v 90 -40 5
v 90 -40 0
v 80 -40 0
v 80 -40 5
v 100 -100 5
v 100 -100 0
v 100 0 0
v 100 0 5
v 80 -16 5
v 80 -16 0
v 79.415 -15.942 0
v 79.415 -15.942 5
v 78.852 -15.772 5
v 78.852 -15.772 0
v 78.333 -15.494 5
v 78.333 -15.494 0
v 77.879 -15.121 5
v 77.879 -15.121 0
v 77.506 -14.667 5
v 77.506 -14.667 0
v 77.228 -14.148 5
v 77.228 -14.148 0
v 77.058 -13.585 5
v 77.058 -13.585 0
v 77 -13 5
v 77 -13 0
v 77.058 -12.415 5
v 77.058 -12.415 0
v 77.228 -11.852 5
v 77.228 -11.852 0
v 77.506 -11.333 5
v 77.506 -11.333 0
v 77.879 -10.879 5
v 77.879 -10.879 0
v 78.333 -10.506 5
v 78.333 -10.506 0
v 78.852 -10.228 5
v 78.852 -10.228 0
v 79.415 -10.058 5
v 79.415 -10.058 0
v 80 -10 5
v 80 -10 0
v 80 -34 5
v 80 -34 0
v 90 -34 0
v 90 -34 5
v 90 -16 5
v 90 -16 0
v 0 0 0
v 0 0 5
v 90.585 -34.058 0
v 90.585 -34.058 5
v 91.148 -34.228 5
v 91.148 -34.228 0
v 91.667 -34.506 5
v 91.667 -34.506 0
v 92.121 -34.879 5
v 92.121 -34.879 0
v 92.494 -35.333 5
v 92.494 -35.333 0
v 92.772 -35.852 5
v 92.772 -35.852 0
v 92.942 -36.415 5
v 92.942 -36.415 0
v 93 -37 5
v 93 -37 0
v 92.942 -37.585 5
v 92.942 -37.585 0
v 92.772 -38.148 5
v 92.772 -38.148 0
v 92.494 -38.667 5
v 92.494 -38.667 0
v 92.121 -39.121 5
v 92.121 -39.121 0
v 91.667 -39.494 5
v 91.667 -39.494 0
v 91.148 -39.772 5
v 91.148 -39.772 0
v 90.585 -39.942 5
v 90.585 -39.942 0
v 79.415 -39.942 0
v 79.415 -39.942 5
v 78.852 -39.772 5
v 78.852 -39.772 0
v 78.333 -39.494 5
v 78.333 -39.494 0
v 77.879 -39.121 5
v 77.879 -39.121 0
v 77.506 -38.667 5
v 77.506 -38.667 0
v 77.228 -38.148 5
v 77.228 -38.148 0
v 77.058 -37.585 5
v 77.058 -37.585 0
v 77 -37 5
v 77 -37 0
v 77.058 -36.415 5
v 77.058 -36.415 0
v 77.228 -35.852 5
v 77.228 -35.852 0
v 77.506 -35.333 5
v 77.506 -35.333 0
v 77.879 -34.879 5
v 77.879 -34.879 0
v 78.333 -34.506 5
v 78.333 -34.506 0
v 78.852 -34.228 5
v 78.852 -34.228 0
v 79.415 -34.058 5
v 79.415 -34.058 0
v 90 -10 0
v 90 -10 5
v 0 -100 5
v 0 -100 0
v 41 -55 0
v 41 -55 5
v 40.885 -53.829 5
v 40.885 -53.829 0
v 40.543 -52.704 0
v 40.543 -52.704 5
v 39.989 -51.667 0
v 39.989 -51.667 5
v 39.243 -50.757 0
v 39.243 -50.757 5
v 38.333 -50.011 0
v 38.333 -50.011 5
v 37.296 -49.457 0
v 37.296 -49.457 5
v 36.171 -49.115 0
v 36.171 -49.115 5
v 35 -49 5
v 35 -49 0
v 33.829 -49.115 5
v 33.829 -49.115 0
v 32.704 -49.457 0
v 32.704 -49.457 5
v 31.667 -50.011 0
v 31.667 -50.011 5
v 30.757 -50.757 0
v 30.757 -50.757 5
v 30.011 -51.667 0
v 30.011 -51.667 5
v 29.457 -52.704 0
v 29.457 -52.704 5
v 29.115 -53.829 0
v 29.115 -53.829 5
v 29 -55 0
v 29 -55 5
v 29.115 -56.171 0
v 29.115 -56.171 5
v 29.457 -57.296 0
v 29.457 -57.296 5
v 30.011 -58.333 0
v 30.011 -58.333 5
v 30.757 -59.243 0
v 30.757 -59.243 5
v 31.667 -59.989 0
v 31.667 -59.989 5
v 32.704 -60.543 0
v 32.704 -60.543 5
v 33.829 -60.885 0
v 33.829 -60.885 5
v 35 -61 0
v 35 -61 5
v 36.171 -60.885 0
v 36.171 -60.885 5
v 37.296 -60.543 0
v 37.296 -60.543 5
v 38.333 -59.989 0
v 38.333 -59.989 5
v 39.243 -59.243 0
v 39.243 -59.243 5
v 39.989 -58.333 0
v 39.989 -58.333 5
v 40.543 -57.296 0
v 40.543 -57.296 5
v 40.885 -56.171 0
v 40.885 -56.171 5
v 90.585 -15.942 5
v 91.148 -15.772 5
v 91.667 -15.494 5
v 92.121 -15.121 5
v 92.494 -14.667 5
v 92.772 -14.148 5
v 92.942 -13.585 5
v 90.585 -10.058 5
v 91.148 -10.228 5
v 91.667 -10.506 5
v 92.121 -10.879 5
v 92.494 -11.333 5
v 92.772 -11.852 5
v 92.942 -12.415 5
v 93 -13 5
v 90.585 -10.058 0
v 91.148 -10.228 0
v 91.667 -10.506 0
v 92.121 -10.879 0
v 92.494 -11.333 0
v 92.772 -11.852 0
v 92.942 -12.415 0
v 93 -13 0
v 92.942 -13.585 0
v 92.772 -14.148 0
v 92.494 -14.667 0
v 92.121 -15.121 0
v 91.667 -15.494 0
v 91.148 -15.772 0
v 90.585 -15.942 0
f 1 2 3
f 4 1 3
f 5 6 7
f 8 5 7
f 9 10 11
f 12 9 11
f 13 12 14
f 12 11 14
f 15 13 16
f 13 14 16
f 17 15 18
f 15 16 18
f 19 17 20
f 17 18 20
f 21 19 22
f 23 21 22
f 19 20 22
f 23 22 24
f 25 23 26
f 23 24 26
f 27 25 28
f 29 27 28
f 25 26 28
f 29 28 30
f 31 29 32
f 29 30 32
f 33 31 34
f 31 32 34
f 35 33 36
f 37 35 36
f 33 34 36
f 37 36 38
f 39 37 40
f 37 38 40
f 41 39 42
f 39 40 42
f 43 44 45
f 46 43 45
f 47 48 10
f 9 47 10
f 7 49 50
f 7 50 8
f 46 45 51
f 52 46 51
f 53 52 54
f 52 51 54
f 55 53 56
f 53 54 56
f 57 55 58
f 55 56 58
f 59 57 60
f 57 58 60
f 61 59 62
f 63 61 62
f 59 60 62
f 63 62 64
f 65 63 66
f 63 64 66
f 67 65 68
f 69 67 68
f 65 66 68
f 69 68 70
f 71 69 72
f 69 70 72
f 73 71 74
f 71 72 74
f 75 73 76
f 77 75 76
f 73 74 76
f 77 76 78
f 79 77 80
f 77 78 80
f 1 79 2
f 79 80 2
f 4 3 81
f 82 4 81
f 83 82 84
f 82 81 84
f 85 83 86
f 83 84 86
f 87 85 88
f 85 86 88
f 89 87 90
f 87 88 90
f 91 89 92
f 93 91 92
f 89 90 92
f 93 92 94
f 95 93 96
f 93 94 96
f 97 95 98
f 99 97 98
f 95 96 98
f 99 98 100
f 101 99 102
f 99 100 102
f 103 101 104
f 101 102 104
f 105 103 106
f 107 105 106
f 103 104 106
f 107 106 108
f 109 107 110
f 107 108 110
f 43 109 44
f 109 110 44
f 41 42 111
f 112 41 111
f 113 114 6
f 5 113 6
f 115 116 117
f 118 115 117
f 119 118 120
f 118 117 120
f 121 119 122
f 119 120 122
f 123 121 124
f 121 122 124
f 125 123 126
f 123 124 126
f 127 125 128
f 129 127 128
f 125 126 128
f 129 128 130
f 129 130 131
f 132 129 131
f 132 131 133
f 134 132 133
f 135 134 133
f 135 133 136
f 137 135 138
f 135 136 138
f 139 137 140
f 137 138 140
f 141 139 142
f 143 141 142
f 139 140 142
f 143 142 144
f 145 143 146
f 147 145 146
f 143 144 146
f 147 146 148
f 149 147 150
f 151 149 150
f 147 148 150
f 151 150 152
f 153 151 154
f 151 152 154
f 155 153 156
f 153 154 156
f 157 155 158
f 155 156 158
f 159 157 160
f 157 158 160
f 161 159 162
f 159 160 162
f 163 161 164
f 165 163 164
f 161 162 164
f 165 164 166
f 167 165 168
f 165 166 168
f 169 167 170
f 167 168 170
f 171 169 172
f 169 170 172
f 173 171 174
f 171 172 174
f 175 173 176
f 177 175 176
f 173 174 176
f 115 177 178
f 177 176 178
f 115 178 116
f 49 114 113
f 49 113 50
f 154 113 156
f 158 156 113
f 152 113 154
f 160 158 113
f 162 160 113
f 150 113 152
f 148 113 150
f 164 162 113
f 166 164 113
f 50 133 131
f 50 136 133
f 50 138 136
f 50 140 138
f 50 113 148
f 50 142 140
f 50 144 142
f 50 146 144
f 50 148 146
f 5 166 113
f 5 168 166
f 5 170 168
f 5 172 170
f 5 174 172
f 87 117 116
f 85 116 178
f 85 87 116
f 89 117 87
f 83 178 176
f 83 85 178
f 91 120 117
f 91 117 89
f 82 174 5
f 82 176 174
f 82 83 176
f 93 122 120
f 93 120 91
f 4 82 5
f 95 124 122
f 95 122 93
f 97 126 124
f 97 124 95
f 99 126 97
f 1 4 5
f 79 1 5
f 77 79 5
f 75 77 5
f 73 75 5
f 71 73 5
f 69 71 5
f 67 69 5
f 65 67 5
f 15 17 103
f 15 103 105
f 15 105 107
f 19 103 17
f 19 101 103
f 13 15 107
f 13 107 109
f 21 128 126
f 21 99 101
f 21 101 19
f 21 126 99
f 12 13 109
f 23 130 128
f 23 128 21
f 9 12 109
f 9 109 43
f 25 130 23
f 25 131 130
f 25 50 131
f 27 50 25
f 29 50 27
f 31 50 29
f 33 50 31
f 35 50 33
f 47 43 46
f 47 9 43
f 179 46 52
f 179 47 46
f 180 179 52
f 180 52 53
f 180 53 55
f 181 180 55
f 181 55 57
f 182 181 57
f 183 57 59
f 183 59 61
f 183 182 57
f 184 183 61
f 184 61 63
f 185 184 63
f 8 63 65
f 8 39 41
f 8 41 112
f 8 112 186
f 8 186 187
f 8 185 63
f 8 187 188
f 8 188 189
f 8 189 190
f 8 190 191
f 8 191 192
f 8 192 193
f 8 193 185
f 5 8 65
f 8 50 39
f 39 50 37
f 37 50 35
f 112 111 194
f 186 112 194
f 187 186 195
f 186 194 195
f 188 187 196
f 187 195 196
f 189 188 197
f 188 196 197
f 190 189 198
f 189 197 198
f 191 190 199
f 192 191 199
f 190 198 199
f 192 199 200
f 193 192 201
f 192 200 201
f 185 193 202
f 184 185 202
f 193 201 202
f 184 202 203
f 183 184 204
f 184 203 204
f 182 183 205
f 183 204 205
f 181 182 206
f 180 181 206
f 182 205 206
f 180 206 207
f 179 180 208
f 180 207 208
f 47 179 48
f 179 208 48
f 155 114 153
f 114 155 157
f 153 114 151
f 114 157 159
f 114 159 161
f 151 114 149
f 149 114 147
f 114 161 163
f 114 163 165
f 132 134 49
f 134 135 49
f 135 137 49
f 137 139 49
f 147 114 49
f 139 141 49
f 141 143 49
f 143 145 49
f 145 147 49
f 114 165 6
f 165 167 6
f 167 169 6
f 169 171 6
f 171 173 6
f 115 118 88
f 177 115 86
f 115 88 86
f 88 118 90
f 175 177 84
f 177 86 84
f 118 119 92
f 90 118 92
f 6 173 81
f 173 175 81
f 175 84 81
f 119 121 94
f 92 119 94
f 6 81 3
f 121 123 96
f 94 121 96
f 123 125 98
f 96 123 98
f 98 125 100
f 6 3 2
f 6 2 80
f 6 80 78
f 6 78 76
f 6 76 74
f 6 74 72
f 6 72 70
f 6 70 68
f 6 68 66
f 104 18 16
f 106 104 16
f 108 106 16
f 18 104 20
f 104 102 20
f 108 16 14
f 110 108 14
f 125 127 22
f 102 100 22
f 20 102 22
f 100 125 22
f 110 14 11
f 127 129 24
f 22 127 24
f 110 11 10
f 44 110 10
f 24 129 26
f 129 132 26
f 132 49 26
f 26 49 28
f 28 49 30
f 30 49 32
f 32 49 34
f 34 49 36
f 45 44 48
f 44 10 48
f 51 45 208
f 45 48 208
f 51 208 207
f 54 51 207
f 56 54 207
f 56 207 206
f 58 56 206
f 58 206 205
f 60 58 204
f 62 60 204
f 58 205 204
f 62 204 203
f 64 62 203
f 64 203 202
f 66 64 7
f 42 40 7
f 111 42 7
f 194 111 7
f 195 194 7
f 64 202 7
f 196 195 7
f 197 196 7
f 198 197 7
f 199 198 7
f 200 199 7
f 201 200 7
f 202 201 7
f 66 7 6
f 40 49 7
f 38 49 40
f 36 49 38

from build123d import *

# Parameters (mm, degrees)
ESQUISSE1_W             = 100
ESQUISSE1_H             = 100
BOSS_EXTRU_1_DEPTH      = 5
ESQUISSE2_R             = 6
ENL_V_MAT_EXTRU_1_DEPTH = 5


with BuildPart() as part:
    # Esquisse1 → Boss.-Extru.1 (new body)
    with BuildSketch(Plane.XY):
        with Locations((50, -50)):
            Rectangle(ESQUISSE1_W, ESQUISSE1_H)
        with BuildLine():
            Line((80, -10), (90, -10))
            ThreePointArc((90, -10), (93, -13), (90, -16))
            Line((90, -16), (80, -16))
            ThreePointArc((80, -16), (77, -13), (80, -10))
        make_face(mode=Mode.SUBTRACT)
        with BuildLine():
            Line((80, -34), (90, -34))
            ThreePointArc((90, -34), (93, -37), (90, -40))
            Line((90, -40), (80, -40))
            ThreePointArc((80, -40), (77, -37), (80, -34))
        make_face(mode=Mode.SUBTRACT)
    extrude(amount=BOSS_EXTRU_1_DEPTH)

    # Esquisse2 → Enlèv. mat.-Extru.1 (cut)
    with BuildSketch(Plane.XY.offset(5)):
        with Locations((35, -55)):
            Circle(ESQUISSE2_R)
    extrude(amount=-ENL_V_MAT_EXTRU_1_DEPTH, mode=Mode.SUBTRACT)


solid = part.part
